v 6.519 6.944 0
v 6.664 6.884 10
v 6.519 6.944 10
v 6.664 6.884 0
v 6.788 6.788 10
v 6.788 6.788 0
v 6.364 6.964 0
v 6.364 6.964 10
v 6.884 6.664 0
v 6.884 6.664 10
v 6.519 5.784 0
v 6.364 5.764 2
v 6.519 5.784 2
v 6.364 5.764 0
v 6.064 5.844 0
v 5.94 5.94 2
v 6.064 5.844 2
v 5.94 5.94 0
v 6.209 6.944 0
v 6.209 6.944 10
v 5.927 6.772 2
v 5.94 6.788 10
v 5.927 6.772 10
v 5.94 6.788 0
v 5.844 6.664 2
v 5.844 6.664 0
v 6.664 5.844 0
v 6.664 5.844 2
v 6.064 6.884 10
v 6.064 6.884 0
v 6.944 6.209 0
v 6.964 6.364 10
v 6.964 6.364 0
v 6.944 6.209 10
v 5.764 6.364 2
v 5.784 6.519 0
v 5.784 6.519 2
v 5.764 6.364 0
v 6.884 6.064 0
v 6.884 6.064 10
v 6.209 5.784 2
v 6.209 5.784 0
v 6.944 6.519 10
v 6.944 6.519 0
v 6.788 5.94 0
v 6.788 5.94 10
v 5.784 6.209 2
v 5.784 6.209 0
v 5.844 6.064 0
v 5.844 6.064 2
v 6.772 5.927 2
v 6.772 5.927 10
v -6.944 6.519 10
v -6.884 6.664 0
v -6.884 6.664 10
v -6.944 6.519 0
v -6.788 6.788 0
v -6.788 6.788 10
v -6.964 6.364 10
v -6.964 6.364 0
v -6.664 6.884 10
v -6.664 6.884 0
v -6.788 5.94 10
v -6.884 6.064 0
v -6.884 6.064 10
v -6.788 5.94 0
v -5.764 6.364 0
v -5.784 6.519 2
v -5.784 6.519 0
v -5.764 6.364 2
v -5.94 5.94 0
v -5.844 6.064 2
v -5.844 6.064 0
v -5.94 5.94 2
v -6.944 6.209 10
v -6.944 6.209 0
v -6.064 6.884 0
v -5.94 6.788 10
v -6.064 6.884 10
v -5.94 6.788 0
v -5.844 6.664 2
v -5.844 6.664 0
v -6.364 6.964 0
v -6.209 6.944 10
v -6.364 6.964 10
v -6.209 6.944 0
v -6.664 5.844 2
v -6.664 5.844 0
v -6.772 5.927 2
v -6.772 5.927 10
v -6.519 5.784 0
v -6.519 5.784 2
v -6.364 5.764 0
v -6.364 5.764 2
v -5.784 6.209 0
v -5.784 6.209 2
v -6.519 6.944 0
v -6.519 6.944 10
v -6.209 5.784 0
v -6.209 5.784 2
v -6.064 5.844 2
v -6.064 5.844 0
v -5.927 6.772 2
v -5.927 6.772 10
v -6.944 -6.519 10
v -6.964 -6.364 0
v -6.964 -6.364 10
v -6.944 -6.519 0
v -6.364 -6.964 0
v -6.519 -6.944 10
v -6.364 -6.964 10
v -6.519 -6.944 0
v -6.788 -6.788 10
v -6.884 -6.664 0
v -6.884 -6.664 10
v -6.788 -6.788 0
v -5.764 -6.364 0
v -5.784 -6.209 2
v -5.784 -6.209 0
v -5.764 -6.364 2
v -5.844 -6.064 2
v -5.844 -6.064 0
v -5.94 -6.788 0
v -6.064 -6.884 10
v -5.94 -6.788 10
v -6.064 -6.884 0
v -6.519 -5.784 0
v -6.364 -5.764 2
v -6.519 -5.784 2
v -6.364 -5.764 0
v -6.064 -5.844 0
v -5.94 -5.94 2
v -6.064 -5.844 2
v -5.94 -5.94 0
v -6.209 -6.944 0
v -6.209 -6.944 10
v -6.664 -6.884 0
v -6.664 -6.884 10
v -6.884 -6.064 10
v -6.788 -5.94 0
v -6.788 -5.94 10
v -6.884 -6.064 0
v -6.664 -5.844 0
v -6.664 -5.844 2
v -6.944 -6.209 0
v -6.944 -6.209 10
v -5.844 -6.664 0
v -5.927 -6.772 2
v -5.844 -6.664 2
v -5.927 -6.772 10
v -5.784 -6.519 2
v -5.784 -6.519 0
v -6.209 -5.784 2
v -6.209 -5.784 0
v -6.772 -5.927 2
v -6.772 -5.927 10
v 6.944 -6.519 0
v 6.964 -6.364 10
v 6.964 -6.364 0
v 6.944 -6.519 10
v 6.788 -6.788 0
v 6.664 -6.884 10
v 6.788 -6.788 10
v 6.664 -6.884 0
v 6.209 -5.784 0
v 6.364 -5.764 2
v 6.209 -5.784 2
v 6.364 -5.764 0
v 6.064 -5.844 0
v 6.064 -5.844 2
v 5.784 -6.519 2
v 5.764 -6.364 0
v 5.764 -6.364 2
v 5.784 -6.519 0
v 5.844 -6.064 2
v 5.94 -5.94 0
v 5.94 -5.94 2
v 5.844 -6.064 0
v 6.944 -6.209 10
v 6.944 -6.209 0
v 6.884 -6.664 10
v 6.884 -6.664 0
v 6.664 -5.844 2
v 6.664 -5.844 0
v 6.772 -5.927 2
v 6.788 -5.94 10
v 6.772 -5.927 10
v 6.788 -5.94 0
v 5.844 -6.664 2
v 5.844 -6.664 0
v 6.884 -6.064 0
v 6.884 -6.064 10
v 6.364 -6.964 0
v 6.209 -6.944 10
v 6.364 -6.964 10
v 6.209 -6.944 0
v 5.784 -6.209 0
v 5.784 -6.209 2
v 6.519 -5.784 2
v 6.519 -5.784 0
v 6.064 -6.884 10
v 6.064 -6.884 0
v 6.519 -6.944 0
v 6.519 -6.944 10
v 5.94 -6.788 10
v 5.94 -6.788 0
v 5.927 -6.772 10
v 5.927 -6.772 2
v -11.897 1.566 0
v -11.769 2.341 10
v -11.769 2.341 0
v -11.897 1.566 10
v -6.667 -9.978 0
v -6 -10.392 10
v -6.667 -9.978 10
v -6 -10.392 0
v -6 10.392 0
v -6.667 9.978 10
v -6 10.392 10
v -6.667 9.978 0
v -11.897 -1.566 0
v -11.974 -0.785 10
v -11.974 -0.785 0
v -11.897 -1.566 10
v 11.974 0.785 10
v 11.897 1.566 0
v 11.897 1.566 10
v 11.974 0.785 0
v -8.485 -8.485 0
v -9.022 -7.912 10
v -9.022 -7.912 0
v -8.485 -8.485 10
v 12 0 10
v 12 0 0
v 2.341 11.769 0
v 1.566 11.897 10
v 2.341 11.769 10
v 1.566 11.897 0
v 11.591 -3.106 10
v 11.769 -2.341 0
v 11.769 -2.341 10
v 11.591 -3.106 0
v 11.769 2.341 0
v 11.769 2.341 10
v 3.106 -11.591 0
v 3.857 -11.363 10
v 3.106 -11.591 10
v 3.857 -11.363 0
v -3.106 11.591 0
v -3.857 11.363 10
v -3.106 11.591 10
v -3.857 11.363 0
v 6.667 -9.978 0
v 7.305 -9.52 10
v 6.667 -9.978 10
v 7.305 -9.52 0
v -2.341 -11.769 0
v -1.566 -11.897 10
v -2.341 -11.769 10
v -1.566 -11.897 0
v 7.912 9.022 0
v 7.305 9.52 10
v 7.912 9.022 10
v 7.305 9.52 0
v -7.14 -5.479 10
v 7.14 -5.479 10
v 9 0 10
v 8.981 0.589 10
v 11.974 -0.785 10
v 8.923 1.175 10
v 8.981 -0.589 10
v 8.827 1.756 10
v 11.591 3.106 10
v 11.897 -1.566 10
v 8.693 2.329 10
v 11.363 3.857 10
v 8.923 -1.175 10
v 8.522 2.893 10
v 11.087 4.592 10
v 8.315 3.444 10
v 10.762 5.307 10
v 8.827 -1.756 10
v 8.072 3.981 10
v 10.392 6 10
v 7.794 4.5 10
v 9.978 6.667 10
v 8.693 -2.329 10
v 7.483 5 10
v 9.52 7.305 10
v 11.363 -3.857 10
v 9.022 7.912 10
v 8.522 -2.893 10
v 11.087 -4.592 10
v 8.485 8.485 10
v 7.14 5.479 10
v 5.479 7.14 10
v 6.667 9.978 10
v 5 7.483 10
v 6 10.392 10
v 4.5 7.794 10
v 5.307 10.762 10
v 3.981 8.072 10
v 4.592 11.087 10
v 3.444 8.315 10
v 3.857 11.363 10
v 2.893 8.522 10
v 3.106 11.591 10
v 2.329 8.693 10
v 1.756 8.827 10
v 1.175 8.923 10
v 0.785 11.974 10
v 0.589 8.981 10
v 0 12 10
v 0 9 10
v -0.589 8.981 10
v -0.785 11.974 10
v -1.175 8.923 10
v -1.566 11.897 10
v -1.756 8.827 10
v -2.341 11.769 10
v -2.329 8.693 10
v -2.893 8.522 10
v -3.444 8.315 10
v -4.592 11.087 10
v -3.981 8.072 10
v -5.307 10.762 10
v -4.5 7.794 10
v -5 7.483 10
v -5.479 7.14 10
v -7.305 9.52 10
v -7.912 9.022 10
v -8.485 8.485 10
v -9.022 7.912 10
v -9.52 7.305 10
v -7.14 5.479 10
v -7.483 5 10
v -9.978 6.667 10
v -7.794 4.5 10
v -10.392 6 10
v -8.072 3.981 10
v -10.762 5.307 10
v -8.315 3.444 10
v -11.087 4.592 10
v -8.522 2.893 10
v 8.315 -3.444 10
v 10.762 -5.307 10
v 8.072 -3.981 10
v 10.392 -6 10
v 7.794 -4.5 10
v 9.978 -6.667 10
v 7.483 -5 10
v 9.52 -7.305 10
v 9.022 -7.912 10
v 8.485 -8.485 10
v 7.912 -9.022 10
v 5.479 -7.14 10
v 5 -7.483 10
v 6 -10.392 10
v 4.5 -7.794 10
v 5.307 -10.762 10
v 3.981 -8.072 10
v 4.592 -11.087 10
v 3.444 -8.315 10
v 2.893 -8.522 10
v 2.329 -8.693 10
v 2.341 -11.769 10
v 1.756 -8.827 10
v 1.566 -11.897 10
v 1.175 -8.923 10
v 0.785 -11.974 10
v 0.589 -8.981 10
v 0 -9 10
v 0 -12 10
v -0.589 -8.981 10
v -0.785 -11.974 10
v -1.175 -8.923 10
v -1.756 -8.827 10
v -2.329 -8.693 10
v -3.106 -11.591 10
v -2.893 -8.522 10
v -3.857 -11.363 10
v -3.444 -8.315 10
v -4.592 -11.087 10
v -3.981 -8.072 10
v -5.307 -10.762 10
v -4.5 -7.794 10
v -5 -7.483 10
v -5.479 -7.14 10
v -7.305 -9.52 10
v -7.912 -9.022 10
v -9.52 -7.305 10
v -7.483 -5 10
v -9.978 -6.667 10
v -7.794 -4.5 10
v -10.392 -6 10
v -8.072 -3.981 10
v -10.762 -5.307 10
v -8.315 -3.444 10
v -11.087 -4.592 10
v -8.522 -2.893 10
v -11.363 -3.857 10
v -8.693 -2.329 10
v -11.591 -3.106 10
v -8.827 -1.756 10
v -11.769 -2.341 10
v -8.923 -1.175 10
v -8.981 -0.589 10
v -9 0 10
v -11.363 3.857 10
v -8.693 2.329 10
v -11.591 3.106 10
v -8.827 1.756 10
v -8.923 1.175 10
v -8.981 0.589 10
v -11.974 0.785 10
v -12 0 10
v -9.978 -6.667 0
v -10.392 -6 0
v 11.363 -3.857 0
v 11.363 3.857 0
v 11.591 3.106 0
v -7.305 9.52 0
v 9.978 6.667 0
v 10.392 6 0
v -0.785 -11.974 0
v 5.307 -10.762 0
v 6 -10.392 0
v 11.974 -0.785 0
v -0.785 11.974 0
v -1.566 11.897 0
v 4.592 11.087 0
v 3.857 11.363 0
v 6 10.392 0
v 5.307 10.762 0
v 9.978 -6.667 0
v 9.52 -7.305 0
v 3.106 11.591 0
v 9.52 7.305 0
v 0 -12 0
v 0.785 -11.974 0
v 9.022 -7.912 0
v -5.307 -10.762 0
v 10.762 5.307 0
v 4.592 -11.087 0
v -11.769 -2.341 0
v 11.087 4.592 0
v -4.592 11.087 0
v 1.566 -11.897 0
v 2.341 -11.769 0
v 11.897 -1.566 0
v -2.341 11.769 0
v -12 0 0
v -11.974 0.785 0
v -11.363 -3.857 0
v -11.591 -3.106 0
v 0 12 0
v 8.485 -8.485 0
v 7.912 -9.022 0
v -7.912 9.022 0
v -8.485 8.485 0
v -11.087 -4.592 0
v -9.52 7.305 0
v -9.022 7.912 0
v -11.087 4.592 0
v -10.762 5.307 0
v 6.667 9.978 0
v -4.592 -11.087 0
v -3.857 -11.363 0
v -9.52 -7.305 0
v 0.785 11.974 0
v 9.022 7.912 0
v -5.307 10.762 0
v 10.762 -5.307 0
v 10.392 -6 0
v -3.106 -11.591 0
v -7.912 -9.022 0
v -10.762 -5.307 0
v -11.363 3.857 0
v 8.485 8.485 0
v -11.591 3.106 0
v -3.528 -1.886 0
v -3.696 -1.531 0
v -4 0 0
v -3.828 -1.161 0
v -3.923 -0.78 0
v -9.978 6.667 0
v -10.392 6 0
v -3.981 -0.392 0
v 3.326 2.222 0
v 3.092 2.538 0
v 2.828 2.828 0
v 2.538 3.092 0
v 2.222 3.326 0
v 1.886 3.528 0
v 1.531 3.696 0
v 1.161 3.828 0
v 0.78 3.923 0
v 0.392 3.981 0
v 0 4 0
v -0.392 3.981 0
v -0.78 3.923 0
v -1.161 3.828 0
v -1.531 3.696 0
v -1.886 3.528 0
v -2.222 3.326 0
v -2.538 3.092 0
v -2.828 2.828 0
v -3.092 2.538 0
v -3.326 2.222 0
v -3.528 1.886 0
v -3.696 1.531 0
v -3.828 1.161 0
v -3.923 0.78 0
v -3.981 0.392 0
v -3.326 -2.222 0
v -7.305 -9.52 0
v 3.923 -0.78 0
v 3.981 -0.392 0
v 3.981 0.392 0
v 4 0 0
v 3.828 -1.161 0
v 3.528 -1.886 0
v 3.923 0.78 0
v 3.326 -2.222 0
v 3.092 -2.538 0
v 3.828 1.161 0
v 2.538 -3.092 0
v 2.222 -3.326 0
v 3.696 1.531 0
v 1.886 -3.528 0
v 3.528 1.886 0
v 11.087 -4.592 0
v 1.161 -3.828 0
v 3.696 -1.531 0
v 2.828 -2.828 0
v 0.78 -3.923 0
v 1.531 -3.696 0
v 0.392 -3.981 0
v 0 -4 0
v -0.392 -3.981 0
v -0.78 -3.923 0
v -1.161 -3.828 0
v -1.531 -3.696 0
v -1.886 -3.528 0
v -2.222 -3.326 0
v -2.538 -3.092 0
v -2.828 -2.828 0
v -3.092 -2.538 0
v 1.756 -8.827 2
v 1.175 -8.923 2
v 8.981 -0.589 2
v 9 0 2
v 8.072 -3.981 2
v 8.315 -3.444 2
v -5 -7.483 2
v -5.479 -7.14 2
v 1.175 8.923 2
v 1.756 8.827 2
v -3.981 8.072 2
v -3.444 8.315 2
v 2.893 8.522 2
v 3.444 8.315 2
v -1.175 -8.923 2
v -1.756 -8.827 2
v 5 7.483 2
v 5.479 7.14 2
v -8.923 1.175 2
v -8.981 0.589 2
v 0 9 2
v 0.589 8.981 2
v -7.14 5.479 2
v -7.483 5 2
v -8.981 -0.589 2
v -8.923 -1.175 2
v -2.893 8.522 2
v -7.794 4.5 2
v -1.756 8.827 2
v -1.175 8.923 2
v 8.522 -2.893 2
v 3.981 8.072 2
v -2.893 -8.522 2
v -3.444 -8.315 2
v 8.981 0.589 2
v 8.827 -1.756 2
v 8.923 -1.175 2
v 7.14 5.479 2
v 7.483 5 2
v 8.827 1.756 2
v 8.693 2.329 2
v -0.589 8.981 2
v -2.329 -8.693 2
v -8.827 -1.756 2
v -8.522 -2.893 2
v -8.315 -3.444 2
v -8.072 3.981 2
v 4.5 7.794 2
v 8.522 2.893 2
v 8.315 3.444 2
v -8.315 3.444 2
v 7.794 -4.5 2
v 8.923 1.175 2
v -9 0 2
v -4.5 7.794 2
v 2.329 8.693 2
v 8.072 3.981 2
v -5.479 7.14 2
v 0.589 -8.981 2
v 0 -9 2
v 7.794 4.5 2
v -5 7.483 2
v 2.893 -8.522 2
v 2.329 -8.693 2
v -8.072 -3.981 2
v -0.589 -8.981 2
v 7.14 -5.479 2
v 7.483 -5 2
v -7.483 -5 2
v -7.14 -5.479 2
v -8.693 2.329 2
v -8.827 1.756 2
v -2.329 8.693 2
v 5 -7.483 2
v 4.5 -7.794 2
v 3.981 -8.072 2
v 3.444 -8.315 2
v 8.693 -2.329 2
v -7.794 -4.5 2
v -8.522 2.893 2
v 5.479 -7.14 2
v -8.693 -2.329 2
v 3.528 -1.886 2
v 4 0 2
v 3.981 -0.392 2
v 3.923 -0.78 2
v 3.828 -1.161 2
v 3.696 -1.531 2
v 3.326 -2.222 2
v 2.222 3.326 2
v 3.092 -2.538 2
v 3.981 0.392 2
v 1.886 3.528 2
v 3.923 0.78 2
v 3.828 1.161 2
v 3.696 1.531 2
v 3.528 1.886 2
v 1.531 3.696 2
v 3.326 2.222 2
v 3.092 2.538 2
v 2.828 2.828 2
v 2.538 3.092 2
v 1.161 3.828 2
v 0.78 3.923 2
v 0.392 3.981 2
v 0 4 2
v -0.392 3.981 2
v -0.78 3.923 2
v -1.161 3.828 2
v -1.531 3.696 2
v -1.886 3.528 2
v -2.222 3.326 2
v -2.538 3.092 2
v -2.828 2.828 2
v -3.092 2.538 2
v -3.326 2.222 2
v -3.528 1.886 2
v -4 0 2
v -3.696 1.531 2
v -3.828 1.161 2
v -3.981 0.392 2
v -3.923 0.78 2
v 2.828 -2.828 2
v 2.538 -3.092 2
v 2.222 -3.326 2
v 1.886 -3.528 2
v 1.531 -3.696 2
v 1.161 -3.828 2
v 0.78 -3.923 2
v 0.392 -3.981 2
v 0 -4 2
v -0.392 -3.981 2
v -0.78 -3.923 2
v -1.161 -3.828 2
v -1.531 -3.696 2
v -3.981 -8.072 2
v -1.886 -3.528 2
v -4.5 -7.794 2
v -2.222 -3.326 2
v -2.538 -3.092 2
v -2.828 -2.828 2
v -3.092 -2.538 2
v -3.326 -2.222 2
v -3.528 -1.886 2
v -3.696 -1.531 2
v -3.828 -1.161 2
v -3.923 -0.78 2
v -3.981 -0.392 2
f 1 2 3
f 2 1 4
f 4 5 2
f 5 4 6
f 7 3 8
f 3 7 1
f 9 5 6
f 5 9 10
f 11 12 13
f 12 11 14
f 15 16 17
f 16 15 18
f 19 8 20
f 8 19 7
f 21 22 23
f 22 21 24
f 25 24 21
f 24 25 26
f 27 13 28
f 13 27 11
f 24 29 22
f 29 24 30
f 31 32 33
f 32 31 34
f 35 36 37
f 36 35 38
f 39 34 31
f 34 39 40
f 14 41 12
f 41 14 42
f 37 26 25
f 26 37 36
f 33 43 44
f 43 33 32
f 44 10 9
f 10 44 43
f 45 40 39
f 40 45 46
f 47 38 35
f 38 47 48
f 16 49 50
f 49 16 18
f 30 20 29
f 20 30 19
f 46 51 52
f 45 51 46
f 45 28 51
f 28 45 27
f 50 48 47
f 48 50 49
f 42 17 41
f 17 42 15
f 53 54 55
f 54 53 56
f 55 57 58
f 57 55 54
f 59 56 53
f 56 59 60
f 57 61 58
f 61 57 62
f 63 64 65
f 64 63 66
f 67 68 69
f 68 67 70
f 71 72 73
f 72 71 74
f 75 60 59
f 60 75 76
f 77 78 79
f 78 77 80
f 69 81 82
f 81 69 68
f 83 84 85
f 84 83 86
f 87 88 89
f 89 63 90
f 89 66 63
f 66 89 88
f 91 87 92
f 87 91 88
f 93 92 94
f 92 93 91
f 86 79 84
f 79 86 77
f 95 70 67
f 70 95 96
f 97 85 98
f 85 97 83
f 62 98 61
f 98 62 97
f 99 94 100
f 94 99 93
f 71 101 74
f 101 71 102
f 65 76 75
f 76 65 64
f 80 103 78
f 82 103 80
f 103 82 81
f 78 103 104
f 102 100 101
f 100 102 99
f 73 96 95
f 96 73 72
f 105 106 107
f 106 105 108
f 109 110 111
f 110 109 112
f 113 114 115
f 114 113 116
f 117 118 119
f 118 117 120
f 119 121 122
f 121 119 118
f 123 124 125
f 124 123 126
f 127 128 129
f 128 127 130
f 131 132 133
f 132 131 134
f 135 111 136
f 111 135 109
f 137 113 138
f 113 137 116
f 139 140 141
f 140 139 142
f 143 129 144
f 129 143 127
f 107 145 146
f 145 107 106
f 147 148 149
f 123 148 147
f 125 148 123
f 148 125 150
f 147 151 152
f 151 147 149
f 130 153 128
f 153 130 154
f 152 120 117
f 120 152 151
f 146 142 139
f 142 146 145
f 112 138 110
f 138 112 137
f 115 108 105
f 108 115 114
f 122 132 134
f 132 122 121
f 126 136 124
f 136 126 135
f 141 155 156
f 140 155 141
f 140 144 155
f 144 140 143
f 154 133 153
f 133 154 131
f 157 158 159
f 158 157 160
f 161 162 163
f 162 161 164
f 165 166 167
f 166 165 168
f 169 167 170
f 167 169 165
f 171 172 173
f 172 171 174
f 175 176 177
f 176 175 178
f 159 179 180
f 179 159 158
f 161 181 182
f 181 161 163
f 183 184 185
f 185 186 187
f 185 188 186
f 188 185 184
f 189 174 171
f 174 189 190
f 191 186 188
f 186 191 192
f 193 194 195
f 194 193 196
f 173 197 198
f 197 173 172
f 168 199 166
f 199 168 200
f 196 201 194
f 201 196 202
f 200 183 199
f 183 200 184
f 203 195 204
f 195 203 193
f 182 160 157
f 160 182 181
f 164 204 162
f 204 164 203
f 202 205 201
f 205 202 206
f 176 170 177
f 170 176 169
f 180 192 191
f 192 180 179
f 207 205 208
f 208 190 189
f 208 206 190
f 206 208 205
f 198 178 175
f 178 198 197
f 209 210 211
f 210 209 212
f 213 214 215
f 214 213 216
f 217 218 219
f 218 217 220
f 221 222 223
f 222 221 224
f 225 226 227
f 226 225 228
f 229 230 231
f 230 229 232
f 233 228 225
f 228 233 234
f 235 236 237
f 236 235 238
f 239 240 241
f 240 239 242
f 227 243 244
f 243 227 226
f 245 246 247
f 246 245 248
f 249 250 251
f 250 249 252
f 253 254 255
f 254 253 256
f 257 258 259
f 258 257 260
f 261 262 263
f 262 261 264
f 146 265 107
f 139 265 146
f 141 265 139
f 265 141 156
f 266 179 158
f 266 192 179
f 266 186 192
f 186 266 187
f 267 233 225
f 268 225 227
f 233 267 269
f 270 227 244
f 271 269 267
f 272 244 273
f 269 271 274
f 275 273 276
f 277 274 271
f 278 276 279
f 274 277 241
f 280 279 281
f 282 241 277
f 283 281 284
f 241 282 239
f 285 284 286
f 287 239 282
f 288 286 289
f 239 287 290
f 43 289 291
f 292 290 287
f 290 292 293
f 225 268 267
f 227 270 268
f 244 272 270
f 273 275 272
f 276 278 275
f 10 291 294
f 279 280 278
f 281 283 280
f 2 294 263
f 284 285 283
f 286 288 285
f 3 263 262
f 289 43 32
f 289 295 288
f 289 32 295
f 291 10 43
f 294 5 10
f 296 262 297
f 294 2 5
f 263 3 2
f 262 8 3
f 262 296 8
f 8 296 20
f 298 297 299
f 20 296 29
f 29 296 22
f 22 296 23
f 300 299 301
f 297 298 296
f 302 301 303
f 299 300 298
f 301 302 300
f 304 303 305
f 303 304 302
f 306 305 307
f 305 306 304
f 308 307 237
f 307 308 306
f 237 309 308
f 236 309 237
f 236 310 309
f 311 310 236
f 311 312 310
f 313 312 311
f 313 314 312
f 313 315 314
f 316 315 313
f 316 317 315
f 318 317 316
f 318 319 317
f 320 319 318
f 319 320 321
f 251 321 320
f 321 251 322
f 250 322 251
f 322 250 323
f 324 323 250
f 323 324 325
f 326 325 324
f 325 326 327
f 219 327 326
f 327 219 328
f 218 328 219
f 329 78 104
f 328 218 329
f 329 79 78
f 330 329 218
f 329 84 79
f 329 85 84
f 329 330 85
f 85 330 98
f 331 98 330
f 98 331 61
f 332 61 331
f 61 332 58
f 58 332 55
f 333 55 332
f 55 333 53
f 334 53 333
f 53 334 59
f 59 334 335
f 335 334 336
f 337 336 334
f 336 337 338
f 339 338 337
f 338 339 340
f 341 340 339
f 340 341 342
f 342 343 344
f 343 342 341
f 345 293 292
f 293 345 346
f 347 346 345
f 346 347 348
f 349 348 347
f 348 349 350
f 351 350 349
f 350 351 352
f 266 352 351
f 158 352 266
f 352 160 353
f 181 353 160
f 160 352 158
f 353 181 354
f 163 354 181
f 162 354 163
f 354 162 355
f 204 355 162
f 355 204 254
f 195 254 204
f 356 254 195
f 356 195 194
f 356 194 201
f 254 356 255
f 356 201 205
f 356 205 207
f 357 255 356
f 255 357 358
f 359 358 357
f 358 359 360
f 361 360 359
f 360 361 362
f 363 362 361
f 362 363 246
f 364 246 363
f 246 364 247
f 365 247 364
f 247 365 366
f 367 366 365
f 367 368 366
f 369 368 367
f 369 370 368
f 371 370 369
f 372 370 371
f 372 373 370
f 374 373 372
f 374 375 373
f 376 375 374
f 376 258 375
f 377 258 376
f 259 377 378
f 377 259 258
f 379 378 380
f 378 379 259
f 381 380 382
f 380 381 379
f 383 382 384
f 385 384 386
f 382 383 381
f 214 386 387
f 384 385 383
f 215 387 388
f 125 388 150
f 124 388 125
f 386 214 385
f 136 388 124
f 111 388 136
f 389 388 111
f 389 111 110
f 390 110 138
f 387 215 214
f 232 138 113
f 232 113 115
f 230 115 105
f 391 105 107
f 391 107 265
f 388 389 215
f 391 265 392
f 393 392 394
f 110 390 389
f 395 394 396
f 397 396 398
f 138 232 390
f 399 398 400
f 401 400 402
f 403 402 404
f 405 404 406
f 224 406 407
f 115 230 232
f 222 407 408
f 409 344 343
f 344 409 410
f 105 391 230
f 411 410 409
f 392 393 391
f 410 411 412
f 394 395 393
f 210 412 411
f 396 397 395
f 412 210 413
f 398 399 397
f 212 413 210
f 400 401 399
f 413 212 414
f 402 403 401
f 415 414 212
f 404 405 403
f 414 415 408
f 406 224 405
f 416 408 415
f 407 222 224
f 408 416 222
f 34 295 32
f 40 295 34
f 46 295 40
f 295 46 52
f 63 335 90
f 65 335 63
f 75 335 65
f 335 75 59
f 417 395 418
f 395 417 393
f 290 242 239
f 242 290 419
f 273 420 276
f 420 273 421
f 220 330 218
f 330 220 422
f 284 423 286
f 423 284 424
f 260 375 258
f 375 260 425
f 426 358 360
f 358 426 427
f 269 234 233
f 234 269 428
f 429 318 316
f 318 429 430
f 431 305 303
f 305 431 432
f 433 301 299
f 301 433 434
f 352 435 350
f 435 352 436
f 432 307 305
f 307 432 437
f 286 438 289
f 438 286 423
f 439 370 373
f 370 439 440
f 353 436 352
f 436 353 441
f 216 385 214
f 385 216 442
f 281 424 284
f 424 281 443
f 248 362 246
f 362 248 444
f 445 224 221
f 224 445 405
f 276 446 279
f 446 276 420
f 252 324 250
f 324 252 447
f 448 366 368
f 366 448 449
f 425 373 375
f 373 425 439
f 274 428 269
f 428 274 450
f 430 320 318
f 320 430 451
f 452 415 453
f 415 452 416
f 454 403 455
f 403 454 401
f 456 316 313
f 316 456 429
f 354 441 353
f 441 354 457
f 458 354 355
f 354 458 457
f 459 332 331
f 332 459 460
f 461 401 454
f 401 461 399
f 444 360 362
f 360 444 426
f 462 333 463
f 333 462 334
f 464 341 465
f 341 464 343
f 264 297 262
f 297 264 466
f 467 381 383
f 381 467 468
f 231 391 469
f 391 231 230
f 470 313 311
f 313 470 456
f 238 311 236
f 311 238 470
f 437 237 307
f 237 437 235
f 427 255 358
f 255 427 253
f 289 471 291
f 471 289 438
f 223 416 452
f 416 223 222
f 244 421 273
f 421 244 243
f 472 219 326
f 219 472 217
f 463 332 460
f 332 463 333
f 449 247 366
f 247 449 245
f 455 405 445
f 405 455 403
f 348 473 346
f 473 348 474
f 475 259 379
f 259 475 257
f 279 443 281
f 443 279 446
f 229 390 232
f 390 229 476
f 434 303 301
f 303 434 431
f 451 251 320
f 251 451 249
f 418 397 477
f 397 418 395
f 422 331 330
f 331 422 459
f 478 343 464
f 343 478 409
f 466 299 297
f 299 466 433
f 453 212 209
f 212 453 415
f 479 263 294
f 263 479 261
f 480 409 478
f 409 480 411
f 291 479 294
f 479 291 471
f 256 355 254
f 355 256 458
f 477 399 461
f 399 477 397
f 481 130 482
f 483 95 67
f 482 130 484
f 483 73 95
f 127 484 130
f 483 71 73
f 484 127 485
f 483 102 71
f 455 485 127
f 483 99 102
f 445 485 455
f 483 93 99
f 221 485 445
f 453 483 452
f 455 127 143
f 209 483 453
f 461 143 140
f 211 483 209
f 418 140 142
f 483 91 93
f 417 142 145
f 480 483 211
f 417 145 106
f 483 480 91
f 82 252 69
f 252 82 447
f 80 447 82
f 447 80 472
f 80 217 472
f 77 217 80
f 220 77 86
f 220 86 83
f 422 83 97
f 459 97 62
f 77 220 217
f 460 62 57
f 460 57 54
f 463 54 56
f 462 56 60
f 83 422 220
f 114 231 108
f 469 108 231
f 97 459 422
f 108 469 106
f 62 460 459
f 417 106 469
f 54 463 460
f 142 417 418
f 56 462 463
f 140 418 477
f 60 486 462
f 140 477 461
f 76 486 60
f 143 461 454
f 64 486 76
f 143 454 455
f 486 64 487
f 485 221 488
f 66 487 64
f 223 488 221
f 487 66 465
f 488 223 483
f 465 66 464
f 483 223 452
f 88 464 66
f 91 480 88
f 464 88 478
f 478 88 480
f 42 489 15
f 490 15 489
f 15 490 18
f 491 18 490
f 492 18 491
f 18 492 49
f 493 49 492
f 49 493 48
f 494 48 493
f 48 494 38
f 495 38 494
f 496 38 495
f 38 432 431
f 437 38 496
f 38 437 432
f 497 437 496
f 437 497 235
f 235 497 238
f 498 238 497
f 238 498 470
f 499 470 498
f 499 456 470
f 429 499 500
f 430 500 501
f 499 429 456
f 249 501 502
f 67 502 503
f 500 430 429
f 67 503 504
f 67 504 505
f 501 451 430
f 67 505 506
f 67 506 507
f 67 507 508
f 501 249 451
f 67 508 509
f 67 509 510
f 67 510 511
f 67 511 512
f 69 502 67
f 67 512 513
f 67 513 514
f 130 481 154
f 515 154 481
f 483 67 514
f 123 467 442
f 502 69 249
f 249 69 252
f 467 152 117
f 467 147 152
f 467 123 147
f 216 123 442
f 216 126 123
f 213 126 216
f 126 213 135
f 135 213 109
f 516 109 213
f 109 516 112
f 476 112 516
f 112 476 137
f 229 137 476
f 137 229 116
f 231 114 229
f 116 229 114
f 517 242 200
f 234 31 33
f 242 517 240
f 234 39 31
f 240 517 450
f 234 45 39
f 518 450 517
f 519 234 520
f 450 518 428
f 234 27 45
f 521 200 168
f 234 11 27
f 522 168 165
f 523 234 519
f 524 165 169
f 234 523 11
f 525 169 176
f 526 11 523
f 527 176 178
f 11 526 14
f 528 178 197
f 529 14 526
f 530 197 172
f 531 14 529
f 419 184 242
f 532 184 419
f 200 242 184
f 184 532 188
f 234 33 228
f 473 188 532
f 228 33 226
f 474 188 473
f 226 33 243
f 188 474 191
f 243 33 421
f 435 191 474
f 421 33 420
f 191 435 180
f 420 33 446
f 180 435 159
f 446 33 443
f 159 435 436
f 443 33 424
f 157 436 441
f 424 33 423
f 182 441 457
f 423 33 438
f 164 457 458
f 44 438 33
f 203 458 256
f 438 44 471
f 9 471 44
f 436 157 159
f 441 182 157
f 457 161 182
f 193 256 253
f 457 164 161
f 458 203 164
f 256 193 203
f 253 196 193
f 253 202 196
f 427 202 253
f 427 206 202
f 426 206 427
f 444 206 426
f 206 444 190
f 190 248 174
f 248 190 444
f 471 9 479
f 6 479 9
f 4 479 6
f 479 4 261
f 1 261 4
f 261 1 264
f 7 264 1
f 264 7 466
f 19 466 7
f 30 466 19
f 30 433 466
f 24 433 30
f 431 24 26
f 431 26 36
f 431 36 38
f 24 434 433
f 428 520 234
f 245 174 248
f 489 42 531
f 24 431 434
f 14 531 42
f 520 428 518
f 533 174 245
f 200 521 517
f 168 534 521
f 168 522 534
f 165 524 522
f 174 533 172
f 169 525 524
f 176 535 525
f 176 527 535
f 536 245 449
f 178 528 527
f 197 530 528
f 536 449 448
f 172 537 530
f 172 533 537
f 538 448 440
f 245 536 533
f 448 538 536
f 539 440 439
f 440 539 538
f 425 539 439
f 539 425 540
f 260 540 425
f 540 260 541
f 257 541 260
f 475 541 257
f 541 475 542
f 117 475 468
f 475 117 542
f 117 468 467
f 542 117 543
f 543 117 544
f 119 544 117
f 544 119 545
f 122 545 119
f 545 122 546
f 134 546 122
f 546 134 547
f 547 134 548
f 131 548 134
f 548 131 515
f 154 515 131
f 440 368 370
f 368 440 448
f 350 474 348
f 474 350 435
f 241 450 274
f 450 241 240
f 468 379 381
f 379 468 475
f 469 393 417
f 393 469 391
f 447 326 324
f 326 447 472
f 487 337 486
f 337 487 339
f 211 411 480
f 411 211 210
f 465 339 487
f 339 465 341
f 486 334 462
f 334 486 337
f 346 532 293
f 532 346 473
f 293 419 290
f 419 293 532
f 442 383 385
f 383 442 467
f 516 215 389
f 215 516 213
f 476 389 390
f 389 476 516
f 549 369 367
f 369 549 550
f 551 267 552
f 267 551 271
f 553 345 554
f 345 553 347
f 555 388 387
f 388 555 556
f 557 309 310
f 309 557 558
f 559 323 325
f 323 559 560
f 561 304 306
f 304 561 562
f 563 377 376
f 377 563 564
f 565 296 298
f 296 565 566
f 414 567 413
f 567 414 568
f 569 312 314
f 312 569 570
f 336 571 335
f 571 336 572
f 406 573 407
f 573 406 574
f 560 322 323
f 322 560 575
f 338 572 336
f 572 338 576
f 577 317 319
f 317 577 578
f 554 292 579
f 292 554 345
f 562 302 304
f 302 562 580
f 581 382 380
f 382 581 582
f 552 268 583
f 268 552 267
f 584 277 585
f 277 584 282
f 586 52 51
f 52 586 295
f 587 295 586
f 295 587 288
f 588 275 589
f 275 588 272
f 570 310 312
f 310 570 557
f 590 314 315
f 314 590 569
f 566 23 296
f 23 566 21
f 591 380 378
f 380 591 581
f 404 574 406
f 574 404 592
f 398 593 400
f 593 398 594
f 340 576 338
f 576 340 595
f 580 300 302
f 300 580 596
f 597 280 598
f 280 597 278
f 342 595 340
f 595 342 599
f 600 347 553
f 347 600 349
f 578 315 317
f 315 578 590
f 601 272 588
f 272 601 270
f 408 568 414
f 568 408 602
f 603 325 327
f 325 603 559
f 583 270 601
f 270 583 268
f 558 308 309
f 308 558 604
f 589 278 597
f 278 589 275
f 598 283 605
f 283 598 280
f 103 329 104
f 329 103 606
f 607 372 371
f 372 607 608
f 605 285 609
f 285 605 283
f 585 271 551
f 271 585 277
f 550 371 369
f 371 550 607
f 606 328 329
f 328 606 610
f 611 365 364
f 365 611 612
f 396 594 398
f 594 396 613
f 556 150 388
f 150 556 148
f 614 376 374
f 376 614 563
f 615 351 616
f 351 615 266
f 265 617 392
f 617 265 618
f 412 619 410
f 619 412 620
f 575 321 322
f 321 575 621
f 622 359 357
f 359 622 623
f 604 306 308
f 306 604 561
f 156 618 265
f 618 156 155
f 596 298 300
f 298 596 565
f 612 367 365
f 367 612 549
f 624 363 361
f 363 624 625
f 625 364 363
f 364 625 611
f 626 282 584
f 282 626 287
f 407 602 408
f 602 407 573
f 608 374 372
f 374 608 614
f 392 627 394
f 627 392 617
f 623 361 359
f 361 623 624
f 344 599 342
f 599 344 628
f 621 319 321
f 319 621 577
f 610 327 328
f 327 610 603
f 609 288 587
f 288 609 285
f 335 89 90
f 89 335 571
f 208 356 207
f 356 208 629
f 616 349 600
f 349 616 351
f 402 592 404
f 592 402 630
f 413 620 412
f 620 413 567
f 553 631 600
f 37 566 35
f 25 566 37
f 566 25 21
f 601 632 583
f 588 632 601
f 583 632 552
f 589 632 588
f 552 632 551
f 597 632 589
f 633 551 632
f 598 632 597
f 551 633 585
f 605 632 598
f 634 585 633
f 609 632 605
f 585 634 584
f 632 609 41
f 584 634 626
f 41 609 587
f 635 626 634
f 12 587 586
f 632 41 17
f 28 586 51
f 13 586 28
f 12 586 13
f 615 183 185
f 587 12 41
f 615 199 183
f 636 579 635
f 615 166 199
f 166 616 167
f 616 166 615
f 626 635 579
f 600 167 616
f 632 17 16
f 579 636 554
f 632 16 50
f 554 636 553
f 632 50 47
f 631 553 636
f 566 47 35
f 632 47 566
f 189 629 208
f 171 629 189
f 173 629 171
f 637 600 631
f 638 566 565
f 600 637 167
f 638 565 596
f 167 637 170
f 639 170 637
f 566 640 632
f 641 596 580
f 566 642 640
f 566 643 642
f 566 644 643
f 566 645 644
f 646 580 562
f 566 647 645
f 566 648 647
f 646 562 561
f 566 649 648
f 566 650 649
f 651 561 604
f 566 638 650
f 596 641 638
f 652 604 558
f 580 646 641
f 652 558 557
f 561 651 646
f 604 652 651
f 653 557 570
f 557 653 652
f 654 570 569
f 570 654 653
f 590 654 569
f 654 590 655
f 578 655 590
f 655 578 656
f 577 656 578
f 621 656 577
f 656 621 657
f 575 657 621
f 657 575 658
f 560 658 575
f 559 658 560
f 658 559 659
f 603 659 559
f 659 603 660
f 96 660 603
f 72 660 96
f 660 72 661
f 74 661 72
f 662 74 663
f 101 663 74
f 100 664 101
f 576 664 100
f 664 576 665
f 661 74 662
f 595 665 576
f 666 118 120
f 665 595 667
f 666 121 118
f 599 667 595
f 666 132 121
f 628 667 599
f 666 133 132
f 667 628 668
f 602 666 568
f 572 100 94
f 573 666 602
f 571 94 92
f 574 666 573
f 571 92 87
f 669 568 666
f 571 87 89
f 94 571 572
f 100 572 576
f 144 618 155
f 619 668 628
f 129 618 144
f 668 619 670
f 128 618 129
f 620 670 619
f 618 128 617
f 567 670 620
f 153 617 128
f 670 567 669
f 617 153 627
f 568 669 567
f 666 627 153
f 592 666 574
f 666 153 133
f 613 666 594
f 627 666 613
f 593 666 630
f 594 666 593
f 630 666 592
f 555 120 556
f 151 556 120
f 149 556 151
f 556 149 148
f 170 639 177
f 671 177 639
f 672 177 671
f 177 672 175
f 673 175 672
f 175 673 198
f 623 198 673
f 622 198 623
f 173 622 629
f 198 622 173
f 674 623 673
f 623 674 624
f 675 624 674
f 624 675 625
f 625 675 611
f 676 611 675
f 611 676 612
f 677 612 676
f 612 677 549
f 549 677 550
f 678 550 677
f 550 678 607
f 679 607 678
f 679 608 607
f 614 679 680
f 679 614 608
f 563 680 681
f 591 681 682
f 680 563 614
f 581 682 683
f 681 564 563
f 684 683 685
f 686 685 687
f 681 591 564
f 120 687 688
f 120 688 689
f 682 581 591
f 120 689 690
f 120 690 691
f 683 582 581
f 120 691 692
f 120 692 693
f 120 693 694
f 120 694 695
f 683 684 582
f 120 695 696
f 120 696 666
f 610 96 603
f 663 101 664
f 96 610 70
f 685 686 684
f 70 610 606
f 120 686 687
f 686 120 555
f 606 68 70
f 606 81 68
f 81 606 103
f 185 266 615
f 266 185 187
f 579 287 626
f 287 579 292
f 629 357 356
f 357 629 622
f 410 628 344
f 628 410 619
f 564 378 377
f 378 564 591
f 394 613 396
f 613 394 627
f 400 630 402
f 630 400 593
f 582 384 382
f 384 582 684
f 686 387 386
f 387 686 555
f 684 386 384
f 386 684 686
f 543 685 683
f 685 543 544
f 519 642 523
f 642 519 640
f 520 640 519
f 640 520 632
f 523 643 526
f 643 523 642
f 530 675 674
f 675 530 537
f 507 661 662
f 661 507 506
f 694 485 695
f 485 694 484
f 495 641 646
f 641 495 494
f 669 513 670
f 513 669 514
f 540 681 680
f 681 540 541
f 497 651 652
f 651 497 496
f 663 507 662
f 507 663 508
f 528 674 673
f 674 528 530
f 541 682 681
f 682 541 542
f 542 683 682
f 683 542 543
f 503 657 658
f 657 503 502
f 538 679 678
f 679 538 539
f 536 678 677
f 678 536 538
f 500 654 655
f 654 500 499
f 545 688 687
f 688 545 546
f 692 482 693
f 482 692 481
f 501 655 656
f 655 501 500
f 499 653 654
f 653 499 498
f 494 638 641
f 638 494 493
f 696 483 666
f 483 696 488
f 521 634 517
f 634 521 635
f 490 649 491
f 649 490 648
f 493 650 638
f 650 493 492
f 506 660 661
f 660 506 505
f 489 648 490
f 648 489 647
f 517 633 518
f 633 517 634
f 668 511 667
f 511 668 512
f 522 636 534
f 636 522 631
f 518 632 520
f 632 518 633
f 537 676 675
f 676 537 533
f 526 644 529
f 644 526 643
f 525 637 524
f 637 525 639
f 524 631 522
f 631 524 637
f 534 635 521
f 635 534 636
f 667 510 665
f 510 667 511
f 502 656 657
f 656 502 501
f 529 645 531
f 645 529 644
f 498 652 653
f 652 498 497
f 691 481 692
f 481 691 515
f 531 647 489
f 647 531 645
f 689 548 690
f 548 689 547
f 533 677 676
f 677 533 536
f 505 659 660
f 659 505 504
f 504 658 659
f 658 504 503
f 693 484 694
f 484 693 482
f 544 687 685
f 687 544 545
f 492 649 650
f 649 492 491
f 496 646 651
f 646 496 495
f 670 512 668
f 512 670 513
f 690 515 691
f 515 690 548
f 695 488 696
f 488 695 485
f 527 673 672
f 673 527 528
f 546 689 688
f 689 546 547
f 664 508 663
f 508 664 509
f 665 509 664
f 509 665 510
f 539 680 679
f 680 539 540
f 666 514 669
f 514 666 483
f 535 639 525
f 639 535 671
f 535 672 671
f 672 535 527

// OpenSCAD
$fn=64;
module sensor_cap() {
  difference() {
    cylinder(d=24,h=10,$fn=96);
    translate([0,0,2]) cylinder(d=18,h=9,$fn=96);
    translate([0,0,-1]) cylinder(d=8,h=12,$fn=64);
    for(a=[45:90:315]) rotate([0,0,a])
      translate([9,0,-1]) cylinder(d=1.2,h=12,$fn=24);
  }
}
sensor_cap();
